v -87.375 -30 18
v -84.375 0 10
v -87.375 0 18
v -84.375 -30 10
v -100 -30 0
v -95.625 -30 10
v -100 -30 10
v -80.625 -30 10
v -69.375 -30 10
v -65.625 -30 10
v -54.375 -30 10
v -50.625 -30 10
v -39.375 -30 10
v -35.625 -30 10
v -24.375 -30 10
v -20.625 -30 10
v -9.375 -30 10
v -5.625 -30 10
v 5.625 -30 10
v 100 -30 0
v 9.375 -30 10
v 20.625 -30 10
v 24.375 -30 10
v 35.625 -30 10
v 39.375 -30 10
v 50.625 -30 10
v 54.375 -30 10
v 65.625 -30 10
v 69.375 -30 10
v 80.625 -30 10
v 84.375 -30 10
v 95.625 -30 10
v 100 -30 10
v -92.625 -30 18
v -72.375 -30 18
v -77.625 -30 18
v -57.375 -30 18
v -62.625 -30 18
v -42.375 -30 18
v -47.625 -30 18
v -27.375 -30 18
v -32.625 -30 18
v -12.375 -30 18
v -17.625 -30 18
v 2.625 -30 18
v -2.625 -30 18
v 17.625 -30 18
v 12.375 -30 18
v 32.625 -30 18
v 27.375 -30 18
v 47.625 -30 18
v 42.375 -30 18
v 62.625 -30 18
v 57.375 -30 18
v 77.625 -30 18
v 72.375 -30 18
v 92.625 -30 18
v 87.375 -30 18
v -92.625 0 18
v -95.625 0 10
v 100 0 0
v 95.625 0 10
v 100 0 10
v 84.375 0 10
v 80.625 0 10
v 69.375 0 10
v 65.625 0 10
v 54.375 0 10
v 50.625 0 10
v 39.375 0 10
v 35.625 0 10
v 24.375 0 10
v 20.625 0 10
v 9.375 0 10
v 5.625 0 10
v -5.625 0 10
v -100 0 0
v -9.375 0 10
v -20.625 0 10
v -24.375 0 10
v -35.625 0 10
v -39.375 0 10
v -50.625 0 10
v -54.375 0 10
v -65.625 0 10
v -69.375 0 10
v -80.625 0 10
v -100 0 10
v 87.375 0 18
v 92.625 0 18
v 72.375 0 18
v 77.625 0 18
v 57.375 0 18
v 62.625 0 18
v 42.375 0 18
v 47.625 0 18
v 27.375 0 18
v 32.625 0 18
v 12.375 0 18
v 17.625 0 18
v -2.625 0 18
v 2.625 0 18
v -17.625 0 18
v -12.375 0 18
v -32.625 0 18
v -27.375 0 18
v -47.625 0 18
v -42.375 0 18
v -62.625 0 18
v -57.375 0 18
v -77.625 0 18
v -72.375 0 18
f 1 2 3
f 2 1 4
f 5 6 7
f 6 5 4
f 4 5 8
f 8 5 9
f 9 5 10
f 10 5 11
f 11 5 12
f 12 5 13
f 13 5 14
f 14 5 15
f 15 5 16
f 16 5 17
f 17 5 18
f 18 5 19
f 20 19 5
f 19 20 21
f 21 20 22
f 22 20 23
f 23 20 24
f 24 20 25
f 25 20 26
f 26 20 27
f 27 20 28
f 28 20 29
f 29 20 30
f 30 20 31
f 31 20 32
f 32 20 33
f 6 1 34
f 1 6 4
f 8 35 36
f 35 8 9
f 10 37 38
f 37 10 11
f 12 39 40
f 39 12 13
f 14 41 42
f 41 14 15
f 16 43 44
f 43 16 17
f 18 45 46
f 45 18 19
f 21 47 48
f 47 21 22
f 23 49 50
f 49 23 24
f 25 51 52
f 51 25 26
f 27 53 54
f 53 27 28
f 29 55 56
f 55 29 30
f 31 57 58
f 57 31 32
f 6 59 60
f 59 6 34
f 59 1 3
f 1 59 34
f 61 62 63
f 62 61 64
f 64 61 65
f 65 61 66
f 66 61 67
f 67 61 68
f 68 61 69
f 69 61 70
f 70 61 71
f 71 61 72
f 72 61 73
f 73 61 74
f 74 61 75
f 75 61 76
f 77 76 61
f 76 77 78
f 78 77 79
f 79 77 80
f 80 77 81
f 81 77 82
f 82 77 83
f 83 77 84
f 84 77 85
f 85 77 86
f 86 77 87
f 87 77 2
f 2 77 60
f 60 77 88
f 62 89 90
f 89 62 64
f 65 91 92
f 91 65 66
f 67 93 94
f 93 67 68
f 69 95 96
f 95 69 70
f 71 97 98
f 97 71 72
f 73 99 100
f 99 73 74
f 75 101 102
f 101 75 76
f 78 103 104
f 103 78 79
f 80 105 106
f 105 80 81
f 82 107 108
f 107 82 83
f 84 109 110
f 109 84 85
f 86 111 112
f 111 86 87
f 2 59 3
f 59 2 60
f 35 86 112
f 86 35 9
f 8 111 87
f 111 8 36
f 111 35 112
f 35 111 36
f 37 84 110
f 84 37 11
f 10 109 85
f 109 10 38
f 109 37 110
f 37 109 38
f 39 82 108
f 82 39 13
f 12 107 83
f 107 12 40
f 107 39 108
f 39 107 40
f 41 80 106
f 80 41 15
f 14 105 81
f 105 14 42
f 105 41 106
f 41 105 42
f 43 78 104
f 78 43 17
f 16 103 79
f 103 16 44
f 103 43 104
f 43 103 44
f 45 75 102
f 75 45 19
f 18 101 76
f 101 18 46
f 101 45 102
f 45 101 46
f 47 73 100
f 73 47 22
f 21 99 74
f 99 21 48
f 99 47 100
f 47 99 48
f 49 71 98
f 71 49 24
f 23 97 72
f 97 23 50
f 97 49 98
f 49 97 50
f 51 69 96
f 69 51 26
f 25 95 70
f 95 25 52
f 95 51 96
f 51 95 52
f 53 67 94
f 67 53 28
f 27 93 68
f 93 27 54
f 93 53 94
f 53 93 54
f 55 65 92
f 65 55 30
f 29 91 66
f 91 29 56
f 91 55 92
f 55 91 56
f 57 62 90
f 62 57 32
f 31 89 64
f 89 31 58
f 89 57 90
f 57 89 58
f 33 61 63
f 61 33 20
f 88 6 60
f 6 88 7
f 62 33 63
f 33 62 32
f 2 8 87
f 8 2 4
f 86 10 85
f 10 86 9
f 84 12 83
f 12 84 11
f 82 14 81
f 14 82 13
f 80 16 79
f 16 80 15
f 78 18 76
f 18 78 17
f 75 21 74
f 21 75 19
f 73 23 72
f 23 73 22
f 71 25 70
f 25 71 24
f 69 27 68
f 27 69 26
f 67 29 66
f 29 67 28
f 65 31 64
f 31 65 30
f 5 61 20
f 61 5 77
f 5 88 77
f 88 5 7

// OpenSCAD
$fn = 32;

// ----------------------------------------------------------------------
// Toothed rack, 13 teeth
// 15 mm pitch, 8 mm teeth
// ----------------------------------------------------------------------

// --- parameters (mm) ---
bar_w = 30;       // bar width (Y)
seat_tol = 0.15;  // tolerance at the seating features
free_tol = 0.5;   // general tolerance on the free sizes
bar_h = 10;       // bar height (Z)
teeth = 13;       // number of teeth
pitch = 15;       // tooth pitch
tooth_h = 8;      // tooth height above the bar
root_w = 12;      // tooth width at the root
crest_w = 5.25;   // tooth width at the crest

// --- derived feature positions (mm) ---
span = (teeth - 1) * pitch;  // = 180   distance between the outer teeth
bar_l = span + root_w + 8;   // = 200   bar length: teeth plus 4 mm at each end
tooth_x = -span / 2;         // = -90   X of the first tooth
height = bar_h + tooth_h;    // = 18   overall height
feature_centers = [
  [tooth_x + 0 * pitch, -bar_w / 2],
  [tooth_x + 1 * pitch, -bar_w / 2],
  [tooth_x + 2 * pitch, -bar_w / 2],
  [tooth_x + 3 * pitch, -bar_w / 2],
  [tooth_x + 4 * pitch, -bar_w / 2],
  [tooth_x + 5 * pitch, -bar_w / 2],
  [tooth_x + 6 * pitch, -bar_w / 2],
  [tooth_x + 7 * pitch, -bar_w / 2],
  [tooth_x + 8 * pitch, -bar_w / 2],
  [tooth_x + 9 * pitch, -bar_w / 2],
  [tooth_x + 10 * pitch, -bar_w / 2],
  [tooth_x + 11 * pitch, -bar_w / 2],
  [tooth_x + 12 * pitch, -bar_w / 2]
];   // tooth centre line, drives the tooth loop

// bar with a rack of teeth, one extruded trapezoium per centre
module rack_tooth() {
  linear_extrude(height = bar_w)
    polygon(points = [
      [0, 0],
      [root_w, 0],
      [root_w / 2 + crest_w / 2, tooth_h + 1],
      [root_w / 2 - crest_w / 2, tooth_h + 1]
    ]);
}

union() {
  translate([-bar_l / 2, -bar_w, 0]) cube([bar_l, bar_w, bar_h]);
  for (centre = feature_centers)
    translate([centre[0] - root_w / 2, 0, bar_h - 1]) rotate([90, 0, 0]) rack_tooth();
}
